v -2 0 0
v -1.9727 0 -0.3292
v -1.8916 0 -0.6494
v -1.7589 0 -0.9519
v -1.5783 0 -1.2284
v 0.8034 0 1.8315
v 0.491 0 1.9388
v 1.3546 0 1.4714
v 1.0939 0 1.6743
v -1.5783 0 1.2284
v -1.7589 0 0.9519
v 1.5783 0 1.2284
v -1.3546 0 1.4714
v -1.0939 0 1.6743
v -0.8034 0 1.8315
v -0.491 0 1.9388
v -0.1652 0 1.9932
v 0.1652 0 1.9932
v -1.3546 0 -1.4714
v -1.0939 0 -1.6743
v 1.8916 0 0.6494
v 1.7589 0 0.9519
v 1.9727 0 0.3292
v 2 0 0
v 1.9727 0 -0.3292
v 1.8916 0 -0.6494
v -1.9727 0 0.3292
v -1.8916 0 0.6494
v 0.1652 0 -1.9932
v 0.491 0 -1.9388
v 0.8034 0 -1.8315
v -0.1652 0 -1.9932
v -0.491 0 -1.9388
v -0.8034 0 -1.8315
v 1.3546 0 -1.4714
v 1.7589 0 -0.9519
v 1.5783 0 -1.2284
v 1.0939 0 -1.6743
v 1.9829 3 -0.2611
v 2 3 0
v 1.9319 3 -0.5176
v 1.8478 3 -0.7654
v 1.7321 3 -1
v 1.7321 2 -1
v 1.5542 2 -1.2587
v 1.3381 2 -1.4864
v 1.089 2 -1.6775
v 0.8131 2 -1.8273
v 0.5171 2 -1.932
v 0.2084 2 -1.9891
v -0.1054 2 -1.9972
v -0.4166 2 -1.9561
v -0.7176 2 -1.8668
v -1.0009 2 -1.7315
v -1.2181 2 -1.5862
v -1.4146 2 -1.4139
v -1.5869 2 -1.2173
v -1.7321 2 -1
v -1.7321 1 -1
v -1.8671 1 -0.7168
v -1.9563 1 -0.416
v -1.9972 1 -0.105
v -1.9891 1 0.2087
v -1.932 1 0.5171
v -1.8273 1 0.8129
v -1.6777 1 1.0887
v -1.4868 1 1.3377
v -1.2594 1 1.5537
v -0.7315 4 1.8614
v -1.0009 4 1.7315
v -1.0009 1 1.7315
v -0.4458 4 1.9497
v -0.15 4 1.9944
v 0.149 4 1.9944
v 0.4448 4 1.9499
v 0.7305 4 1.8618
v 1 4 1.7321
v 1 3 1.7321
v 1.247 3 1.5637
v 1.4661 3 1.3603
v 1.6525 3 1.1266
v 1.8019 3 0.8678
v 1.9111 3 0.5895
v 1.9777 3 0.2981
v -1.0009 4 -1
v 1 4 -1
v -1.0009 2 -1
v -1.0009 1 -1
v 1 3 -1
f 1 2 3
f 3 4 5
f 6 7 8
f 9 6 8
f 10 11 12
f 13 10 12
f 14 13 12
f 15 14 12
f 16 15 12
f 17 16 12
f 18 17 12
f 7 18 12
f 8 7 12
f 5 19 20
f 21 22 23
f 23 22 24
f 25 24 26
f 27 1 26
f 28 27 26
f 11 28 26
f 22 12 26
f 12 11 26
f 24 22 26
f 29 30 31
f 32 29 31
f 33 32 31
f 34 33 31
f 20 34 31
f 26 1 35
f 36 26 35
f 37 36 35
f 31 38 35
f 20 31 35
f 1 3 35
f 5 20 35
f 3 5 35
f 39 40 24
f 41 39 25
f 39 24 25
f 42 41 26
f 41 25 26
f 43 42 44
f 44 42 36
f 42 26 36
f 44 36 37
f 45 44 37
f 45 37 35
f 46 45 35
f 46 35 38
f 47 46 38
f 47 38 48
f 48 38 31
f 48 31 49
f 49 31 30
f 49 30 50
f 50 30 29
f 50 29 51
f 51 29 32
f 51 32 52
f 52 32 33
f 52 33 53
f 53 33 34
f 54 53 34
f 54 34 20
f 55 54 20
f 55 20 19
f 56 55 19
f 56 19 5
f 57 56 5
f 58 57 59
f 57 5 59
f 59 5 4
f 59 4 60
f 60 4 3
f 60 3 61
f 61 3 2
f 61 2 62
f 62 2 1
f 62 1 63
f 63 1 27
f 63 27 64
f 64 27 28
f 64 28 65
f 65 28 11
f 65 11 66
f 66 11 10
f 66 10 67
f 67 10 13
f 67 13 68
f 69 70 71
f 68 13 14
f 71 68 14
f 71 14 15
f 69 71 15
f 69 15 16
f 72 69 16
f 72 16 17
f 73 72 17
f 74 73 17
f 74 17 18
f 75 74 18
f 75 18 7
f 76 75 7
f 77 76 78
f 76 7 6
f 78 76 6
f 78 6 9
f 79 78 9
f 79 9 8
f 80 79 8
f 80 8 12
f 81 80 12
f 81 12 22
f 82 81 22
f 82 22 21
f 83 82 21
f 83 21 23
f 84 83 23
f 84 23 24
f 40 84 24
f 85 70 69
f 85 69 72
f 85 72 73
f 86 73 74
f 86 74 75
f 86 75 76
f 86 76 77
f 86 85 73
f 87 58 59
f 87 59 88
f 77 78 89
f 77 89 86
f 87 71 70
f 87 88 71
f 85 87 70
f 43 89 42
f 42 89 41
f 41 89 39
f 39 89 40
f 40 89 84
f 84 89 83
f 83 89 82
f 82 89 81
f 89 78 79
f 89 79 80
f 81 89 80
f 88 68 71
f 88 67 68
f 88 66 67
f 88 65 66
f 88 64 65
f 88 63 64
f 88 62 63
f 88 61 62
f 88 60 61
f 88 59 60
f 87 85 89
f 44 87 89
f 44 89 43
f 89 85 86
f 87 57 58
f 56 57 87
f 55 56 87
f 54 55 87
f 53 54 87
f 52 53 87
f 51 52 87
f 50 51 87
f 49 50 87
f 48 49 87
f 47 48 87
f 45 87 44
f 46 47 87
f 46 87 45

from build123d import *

# Parameters (mm, degrees)
SKETCH1_R               = 2
BOSS_EXTRUDE1_DEPTH     = 4
SKETCH2_W               = 1
SKETCH2_H               = 1
CUT_EXTRUDE1_DEPTH      = 2
CUT_EXTRUDE2_DEPTH      = 2
SKETCH4_W               = 0.999117212
SKETCH4_H               = 1
CUT_EXTRUDE3_DEPTH      = 2
CUT_EXTRUDE3_DEPTH_BACK = 1


with BuildPart() as part:
    # Sketch1 → Boss-Extrude1 (new body)
    with BuildSketch(Plane(origin=(0, 0, 0), x_dir=(1, 0, 0), z_dir=(0, 1, 0))):
        Circle(SKETCH1_R)
    extrude(amount=BOSS_EXTRUDE1_DEPTH)

    # Sketch2 → Cut-Extrude1 (cut, symmetric)
    with BuildSketch(Plane.XY):
        Polygon((-1.000882788, 3), (-1.000882788, 4), (-2, 4), (-2, 2), (-1.000882788, 2), align=None)
        with Locations((1.5, 3.5)):
            Rectangle(SKETCH2_W, SKETCH2_H)
    extrude(amount=CUT_EXTRUDE1_DEPTH, both=True, mode=Mode.SUBTRACT)

    # Sketch3 → Cut-Extrude2 (cut)
    with BuildSketch(Plane(origin=(0, 4, 0), x_dir=(1, 0, 0), z_dir=(0, 1, 0))):
        with BuildLine():
            Line((-1.732050808, 1), (1.732050808, 1))
            ThreePointArc((1.732050808, 1), (0, 2), (-1.732050808, 1))
        make_face()
    extrude(amount=-CUT_EXTRUDE2_DEPTH, mode=Mode.SUBTRACT)

    # Sketch4 → Cut-Extrude3 (cut, two sides)
    with BuildSketch(Plane.XY) as cut_extrude3_sk:
        with Locations((-1.500441394, 1.5)):
            Rectangle(SKETCH4_W, SKETCH4_H)
    extrude(amount=CUT_EXTRUDE3_DEPTH, mode=Mode.SUBTRACT)
    extrude(cut_extrude3_sk.sketch, amount=-CUT_EXTRUDE3_DEPTH_BACK, mode=Mode.SUBTRACT)


solid = part.part
